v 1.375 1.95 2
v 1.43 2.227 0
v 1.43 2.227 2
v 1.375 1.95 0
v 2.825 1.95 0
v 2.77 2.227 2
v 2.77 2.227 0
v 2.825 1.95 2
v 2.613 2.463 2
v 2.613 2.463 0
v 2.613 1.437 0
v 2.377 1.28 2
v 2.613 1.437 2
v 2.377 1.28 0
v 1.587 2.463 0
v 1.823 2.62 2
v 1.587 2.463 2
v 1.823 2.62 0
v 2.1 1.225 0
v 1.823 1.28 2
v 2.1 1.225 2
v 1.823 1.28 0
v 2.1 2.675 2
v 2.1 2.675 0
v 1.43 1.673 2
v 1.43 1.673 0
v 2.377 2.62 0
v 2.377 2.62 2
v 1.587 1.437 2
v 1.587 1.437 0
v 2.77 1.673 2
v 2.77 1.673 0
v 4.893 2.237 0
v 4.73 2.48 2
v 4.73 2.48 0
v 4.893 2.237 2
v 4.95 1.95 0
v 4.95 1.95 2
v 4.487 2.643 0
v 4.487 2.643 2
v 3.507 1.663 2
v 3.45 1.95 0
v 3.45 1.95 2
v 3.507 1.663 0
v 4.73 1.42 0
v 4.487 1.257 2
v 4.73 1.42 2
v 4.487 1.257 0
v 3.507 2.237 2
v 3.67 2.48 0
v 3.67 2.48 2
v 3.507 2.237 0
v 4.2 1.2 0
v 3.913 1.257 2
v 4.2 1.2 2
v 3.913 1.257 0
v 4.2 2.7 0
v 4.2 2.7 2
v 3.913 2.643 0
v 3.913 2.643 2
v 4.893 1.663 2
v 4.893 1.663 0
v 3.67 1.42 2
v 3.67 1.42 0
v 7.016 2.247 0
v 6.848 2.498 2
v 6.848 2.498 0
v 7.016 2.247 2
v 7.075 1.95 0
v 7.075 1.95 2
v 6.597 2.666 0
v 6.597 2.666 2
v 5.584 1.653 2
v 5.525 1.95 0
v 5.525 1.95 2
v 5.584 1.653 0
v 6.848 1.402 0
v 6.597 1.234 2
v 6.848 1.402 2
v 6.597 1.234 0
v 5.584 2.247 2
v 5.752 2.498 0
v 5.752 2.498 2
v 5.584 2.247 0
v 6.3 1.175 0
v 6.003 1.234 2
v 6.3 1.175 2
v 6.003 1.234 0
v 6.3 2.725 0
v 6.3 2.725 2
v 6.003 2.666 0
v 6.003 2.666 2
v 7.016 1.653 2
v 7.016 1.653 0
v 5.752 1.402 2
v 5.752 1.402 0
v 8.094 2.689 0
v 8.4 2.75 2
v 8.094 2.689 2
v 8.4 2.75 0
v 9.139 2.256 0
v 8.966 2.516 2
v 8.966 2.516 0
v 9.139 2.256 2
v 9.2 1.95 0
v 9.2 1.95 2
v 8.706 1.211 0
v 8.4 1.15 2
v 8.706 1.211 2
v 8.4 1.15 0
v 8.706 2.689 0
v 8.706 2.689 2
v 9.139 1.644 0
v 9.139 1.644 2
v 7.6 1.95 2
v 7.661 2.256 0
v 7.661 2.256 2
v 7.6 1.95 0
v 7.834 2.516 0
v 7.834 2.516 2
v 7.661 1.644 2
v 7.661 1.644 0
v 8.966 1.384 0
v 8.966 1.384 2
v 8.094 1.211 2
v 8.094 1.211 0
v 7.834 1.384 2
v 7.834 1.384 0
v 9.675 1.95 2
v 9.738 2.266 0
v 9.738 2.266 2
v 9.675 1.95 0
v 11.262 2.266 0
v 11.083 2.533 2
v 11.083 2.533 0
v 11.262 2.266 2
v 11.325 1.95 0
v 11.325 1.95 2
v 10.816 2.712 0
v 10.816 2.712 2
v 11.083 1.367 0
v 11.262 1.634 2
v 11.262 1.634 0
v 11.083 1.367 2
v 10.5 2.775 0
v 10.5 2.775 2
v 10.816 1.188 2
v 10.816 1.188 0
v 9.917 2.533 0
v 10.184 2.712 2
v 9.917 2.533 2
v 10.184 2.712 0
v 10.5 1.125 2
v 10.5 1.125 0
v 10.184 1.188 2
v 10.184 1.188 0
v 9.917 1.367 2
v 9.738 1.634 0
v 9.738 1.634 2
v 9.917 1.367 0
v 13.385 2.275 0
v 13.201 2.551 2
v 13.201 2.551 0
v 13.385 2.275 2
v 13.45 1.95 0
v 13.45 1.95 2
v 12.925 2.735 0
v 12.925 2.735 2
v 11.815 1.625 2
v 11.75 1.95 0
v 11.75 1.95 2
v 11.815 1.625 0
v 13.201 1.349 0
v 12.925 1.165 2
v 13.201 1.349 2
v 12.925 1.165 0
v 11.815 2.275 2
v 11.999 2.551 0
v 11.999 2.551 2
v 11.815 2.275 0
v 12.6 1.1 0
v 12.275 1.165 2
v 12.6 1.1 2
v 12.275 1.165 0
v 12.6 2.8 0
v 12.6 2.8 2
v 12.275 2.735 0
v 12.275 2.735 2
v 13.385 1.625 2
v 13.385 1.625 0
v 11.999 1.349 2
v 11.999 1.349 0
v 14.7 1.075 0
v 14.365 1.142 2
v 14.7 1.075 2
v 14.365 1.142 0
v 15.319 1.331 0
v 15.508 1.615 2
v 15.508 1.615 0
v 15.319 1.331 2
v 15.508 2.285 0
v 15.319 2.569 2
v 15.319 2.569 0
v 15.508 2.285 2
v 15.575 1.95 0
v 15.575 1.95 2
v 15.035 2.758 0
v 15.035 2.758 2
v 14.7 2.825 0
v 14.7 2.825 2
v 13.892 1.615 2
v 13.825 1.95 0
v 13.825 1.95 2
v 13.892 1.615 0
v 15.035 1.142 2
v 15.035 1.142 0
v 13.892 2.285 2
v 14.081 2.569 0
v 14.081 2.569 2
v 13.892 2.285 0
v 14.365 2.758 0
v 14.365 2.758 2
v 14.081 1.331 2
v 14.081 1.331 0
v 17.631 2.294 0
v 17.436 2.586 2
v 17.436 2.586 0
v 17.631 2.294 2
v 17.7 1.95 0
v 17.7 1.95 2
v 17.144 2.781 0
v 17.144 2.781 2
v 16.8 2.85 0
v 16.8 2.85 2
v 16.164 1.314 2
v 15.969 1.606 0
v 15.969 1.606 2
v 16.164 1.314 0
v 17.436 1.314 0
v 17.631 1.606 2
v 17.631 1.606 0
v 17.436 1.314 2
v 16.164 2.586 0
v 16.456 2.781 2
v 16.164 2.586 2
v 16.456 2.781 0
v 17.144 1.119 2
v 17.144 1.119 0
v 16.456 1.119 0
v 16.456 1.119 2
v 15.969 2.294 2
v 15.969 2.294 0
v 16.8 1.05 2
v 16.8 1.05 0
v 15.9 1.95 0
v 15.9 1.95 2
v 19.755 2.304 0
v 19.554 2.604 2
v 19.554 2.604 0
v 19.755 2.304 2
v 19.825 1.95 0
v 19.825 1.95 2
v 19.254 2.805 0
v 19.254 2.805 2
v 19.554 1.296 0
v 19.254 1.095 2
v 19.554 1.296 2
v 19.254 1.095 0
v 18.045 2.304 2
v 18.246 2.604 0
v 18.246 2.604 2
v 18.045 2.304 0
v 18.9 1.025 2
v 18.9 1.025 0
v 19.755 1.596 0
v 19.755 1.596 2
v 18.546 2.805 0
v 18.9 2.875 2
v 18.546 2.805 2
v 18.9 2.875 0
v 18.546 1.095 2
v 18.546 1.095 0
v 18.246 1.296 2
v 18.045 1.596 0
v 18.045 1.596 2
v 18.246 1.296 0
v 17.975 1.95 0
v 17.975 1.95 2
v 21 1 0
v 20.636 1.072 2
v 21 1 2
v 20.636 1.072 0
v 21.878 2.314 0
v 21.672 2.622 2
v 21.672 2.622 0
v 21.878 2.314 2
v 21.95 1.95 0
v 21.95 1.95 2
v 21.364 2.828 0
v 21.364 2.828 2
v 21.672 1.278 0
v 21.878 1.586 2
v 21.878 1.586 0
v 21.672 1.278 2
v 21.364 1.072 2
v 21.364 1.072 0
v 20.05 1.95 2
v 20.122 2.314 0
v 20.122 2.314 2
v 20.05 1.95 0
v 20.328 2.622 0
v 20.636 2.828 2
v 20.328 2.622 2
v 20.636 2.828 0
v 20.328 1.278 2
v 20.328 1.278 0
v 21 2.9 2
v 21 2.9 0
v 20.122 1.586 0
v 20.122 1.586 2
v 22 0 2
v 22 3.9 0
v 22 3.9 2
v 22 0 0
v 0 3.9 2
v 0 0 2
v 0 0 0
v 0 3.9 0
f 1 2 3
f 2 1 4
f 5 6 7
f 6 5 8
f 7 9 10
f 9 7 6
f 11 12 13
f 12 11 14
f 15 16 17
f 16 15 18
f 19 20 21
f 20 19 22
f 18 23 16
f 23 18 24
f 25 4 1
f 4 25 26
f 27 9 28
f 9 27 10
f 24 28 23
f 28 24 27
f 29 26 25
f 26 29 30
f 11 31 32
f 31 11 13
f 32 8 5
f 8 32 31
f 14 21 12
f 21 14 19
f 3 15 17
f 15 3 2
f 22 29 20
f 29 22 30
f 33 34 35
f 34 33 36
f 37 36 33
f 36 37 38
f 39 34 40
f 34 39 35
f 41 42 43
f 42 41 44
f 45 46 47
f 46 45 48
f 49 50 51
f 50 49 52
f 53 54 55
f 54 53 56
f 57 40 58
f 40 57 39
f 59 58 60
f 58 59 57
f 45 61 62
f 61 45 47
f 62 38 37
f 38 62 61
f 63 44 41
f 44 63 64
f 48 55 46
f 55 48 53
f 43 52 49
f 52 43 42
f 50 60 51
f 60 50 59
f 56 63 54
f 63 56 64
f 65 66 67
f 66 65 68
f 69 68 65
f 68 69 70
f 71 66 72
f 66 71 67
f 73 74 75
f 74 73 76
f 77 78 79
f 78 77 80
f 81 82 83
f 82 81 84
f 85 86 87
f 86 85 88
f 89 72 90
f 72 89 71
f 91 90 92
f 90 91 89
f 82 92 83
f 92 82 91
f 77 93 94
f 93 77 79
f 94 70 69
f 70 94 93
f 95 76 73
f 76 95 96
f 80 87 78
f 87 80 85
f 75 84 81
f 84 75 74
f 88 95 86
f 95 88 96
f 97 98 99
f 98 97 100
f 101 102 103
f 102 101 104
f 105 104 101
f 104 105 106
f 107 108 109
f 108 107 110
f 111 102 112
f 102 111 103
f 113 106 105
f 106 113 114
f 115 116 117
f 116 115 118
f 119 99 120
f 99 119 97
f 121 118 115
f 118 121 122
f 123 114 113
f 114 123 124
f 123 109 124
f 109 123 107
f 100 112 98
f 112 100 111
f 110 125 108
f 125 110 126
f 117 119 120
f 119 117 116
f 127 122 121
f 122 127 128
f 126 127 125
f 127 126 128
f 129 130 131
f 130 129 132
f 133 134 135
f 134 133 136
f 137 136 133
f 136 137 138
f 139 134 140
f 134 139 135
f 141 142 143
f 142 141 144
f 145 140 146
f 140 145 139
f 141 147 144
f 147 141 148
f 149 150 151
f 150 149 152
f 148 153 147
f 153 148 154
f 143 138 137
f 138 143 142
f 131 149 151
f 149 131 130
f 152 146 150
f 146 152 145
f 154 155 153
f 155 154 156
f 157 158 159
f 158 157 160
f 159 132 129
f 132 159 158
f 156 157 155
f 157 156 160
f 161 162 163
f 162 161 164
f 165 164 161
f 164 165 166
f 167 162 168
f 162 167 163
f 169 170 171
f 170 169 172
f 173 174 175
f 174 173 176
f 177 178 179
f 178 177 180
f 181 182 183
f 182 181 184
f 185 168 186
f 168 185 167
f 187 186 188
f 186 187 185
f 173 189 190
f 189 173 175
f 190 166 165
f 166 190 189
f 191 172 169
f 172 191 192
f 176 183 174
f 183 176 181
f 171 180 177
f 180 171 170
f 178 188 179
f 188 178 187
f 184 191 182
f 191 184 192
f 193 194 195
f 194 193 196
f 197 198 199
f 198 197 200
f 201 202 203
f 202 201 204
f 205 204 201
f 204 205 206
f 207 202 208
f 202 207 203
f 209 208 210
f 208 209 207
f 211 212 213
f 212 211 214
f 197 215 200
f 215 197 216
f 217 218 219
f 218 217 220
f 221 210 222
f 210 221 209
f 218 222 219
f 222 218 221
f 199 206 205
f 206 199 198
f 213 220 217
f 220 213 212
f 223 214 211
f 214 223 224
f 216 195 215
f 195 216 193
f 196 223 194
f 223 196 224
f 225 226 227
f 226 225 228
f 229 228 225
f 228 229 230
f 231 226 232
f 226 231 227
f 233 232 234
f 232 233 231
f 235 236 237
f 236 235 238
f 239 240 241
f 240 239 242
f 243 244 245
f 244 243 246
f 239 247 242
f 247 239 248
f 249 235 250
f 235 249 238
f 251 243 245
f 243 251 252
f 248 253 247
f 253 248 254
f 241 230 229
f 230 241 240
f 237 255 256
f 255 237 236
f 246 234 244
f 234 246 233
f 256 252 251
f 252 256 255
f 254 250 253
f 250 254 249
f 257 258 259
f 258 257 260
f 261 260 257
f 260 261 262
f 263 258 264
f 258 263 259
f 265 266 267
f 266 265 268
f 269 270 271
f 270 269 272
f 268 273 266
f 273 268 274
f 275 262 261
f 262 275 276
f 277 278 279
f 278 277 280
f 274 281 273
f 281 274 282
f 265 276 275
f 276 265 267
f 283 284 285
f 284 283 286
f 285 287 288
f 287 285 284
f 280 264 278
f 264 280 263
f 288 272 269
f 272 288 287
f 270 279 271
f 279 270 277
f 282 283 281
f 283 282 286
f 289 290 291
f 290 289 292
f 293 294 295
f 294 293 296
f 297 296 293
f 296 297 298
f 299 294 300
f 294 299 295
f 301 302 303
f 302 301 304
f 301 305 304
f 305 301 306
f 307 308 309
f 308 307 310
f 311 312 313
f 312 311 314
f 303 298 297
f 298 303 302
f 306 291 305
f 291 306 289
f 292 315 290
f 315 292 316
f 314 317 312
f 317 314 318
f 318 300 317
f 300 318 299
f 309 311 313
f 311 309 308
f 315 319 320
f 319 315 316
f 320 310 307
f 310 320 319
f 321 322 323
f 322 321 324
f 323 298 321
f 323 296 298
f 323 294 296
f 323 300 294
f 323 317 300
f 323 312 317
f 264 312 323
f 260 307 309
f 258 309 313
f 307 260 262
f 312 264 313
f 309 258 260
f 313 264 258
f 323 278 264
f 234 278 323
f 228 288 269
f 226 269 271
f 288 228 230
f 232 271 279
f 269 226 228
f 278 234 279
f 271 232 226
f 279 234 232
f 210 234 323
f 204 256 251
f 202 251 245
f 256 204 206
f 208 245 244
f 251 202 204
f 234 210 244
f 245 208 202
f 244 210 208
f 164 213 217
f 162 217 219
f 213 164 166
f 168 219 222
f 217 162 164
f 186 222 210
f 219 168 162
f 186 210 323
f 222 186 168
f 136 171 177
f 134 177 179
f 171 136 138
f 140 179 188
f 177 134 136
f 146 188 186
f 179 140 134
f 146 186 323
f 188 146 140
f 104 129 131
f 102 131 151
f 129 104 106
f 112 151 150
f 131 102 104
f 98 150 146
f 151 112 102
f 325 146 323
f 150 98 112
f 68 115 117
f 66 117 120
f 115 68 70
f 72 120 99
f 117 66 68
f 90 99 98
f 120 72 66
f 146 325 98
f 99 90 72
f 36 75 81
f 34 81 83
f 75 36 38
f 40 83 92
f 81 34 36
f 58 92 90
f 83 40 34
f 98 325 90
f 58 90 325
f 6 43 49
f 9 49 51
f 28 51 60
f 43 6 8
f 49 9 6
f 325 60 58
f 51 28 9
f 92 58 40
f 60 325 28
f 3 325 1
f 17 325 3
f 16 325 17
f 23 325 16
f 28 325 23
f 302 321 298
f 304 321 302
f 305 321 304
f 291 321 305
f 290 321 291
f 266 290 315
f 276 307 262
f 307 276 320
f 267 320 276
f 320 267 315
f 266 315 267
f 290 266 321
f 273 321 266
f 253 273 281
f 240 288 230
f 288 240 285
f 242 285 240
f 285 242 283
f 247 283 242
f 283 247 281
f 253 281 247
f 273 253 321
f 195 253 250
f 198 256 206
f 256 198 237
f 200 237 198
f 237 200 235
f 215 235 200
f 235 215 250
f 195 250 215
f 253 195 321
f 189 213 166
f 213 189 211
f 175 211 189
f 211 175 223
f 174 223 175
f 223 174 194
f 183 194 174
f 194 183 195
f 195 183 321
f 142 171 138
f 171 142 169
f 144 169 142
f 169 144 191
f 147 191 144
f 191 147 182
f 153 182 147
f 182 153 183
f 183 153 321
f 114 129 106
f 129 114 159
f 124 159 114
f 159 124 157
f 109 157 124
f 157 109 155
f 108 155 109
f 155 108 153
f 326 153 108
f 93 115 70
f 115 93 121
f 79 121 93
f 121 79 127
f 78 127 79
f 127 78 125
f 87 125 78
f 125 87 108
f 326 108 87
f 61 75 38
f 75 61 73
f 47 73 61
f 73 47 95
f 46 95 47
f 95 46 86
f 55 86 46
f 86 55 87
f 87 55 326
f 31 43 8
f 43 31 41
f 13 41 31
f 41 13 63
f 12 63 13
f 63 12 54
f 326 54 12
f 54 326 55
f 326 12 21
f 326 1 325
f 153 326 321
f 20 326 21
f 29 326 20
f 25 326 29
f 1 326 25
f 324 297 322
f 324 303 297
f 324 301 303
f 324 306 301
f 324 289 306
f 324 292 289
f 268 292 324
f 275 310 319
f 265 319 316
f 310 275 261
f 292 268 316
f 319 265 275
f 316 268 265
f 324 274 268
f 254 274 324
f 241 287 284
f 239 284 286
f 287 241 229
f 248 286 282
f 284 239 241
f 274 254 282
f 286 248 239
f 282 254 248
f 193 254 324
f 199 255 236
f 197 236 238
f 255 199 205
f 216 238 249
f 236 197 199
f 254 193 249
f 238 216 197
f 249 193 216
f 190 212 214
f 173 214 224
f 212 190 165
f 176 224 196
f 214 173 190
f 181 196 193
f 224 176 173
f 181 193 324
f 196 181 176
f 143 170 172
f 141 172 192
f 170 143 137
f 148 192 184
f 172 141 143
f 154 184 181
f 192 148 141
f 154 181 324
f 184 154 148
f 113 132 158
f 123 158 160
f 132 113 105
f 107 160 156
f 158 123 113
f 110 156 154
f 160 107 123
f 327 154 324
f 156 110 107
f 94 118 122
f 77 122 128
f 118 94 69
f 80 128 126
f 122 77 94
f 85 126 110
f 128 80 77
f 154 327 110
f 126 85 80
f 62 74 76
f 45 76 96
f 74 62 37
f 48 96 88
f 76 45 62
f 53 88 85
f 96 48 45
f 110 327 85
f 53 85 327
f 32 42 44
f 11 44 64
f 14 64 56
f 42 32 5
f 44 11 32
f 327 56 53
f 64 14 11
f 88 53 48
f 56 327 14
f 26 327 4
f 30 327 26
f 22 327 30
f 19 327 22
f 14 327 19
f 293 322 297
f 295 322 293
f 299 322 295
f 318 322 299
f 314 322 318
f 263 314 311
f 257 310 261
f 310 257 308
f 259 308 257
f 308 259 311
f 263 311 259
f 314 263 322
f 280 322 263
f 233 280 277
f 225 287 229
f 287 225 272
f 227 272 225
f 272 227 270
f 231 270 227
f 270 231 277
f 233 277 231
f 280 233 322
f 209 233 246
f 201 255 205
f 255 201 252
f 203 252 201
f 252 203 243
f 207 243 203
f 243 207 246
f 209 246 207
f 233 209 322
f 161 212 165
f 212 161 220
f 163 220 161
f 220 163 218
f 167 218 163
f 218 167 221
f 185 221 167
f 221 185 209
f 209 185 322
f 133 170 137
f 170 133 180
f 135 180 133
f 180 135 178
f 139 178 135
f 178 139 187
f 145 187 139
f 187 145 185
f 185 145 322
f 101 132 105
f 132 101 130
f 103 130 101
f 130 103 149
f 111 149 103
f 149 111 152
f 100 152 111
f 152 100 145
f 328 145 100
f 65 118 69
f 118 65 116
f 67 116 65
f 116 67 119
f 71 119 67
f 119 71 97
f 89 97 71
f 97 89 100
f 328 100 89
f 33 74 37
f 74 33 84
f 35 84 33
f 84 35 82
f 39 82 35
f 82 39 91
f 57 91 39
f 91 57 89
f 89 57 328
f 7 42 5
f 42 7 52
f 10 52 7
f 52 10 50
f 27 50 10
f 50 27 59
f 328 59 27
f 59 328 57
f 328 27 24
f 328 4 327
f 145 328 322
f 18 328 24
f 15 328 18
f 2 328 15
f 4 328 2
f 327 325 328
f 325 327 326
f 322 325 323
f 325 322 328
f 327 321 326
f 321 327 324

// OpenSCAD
numHoles=10;
increment=0.05;//diameter in mm
minHoleSize=1.4; //value in mm
maxHoleSize=minHoleSize+increment*numHoles;
sheetHeight=2;
padding=0.2;
$fn=16;
difference(){
    
    cube([numHoles*(maxHoleSize+padding+0.1),maxHoleSize+2,sheetHeight]);
    {
        for(i=[1:numHoles]){
            translate([i*(maxHoleSize+padding),maxHoleSize/2+1,-0.1])
            cylinder(d=(minHoleSize+increment*i),h=10);
            }
            
        }



}
